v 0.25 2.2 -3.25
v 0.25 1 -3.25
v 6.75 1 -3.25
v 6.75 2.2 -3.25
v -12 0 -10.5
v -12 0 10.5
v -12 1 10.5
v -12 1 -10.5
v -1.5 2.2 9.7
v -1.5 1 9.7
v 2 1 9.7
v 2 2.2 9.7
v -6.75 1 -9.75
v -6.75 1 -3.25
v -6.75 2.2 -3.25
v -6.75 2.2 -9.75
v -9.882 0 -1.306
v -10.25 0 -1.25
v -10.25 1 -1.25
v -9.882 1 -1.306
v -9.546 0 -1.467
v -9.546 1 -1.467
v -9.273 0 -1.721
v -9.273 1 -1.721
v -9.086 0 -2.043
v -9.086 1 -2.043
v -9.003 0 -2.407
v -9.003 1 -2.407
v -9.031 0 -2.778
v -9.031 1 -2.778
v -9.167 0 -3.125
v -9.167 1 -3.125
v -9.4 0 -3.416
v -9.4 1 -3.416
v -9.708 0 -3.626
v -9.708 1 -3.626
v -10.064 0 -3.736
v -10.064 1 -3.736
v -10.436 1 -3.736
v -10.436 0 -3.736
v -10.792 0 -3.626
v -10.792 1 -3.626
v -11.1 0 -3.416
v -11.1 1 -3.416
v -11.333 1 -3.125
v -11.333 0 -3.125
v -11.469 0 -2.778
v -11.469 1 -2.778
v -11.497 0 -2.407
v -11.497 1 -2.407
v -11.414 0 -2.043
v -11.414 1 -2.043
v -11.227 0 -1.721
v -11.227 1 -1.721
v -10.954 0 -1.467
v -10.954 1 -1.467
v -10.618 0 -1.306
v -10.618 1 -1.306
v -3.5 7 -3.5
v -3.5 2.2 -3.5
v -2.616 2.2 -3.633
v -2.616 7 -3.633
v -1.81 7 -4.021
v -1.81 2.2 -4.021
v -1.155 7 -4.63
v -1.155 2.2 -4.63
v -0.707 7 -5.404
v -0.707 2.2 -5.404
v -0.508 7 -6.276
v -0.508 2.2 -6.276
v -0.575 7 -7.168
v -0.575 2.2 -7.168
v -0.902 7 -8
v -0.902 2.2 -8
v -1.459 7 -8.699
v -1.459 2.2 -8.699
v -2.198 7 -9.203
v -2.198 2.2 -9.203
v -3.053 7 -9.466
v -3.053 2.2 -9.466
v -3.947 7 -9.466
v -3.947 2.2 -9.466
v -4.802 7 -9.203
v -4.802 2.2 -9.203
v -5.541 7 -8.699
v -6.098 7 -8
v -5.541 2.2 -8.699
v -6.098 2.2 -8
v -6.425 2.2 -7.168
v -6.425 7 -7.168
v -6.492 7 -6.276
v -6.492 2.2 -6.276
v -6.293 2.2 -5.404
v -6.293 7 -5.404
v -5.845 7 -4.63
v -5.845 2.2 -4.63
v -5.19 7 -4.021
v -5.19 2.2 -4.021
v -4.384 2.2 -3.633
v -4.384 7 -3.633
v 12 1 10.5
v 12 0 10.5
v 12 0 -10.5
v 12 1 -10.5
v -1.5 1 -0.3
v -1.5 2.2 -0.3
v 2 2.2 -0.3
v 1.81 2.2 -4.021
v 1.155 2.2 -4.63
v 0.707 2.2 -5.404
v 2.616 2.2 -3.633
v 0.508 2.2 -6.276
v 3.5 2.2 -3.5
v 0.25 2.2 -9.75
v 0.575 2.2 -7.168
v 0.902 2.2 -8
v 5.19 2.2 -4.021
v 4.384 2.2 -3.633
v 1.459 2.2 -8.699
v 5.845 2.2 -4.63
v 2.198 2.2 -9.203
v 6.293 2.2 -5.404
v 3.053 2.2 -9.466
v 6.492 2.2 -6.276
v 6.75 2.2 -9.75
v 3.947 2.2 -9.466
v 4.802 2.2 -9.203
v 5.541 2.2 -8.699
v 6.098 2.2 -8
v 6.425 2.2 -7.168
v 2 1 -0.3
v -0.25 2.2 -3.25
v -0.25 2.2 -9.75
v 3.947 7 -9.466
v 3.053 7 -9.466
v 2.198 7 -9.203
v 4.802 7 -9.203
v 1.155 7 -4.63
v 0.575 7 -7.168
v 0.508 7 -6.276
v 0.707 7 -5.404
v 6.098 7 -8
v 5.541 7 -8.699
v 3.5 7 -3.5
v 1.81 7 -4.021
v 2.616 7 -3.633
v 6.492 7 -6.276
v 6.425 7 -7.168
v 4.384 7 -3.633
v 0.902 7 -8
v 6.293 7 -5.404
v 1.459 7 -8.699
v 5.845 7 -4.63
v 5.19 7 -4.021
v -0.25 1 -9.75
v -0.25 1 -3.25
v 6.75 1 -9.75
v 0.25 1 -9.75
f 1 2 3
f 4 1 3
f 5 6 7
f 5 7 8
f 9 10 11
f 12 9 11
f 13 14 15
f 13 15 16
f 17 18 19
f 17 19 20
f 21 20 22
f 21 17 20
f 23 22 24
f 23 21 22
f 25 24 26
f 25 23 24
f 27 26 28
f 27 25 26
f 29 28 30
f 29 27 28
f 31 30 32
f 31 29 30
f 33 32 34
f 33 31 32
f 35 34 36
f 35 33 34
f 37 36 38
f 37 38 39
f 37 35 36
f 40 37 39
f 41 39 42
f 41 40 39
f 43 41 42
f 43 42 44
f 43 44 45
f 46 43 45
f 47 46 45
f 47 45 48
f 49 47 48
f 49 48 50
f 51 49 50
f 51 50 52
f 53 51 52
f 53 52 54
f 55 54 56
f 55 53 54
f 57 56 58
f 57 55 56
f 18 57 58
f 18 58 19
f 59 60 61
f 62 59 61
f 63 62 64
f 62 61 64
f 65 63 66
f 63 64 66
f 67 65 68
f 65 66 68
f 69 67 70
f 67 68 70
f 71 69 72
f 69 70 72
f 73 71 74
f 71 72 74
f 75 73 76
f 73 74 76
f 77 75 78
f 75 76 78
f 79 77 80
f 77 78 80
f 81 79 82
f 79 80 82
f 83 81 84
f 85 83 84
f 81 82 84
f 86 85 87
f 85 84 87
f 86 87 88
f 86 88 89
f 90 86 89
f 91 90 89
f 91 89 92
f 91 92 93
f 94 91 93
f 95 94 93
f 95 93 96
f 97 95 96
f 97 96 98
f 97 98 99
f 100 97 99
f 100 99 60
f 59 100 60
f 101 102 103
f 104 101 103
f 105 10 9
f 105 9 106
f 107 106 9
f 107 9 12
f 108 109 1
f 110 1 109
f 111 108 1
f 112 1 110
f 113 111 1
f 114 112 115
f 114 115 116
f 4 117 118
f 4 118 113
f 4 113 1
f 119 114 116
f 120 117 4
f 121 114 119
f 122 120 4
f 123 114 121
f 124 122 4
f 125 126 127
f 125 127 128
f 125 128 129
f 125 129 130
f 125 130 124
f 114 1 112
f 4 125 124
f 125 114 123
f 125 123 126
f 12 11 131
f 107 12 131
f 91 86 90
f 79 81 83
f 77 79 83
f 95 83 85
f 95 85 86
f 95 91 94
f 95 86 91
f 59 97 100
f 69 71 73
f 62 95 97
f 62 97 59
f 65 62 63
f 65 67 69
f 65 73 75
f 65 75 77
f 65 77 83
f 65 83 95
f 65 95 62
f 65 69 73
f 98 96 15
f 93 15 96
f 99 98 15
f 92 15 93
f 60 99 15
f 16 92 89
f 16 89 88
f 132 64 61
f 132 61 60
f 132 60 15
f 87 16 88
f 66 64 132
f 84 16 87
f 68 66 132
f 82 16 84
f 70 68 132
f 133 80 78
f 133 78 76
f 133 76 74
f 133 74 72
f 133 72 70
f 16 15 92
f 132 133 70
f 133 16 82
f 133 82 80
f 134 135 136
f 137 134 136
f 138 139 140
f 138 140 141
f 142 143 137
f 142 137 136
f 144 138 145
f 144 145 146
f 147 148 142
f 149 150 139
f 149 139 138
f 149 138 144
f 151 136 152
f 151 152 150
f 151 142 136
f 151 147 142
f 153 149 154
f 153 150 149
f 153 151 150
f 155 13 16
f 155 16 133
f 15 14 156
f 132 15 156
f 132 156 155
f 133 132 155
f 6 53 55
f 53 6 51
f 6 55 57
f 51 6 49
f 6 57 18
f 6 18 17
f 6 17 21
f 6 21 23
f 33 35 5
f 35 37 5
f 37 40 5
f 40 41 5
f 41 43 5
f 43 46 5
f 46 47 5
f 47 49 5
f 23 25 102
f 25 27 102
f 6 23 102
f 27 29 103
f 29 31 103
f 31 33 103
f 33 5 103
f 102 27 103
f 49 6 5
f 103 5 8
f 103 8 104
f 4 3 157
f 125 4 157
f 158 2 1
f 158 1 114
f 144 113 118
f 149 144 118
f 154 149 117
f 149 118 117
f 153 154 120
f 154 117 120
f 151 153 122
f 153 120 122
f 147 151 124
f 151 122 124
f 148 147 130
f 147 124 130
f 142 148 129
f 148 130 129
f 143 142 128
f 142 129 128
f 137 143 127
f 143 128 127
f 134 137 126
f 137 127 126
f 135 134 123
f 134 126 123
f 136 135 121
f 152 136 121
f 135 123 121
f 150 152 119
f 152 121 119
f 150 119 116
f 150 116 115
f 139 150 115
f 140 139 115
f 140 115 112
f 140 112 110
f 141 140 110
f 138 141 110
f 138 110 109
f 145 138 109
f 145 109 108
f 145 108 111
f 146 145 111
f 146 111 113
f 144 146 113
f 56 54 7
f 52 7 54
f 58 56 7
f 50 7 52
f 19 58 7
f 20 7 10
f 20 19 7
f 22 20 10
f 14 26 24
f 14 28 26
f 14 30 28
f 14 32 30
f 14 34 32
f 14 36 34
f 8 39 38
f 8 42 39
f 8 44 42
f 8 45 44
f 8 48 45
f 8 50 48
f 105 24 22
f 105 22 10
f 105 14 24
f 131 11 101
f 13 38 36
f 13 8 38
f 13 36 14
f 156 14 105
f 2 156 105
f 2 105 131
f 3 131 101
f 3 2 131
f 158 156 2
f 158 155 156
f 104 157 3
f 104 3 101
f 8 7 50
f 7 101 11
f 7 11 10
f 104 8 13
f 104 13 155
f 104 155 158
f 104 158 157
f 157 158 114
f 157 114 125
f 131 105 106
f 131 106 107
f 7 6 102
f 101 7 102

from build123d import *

# Parameters (mm, degrees)
SKETCH1_W           = 24
SKETCH1_H           = 21
SKETCH1_R           = 1.25
BOSS_EXTRUDE1_DEPTH = 1
SKETCH2_R           = 3
BOSS_EXTRUDE2_DEPTH = 6
SKETCH3_W           = 6.5
SKETCH3_H           = 6.5
SKETCH3_W_2         = 3.5
SKETCH3_H_2         = 10
BOSS_EXTRUDE3_DEPTH = 1.2


with BuildPart() as part:
    # Sketch1 → Boss-Extrude1 (new body)
    with BuildSketch(Plane(origin=(0, 0, 0), x_dir=(1, 0, 0), z_dir=(0, 1, 0))):
        Rectangle(SKETCH1_W, SKETCH1_H)
        with Locations(Location((-10.25, 2.5, 0), (0, 0, 270))):
            Circle(SKETCH1_R, mode=Mode.SUBTRACT)
    extrude(amount=BOSS_EXTRUDE1_DEPTH)

    # Sketch2 → Boss-Extrude2 (add)
    with BuildSketch(Plane(origin=(0, 1, 0), x_dir=(1, 0, 0), z_dir=(0, 1, 0))):
        with Locations(Location((3.5, 6.5, 0), (0, 0, 270))):
            Circle(SKETCH2_R)
        with Locations(Location((-3.5, 6.5, 0), (0, 0, 270))):
            Circle(SKETCH2_R)
    extrude(amount=BOSS_EXTRUDE2_DEPTH)

    # Sketch3 → Boss-Extrude3 (add)
    with BuildSketch(Plane(origin=(0, 1, 0), x_dir=(1, 0, 0), z_dir=(0, 1, 0))):
        with Locations((-3.5, 6.5)):
            Rectangle(SKETCH3_W, SKETCH3_H)
        with Locations((3.5, 6.5)):
            Rectangle(SKETCH3_W, SKETCH3_H)
        with Locations((0.25, -4.7)):
            Rectangle(SKETCH3_W_2, SKETCH3_H_2)
    extrude(amount=BOSS_EXTRUDE3_DEPTH)


solid = part.part
